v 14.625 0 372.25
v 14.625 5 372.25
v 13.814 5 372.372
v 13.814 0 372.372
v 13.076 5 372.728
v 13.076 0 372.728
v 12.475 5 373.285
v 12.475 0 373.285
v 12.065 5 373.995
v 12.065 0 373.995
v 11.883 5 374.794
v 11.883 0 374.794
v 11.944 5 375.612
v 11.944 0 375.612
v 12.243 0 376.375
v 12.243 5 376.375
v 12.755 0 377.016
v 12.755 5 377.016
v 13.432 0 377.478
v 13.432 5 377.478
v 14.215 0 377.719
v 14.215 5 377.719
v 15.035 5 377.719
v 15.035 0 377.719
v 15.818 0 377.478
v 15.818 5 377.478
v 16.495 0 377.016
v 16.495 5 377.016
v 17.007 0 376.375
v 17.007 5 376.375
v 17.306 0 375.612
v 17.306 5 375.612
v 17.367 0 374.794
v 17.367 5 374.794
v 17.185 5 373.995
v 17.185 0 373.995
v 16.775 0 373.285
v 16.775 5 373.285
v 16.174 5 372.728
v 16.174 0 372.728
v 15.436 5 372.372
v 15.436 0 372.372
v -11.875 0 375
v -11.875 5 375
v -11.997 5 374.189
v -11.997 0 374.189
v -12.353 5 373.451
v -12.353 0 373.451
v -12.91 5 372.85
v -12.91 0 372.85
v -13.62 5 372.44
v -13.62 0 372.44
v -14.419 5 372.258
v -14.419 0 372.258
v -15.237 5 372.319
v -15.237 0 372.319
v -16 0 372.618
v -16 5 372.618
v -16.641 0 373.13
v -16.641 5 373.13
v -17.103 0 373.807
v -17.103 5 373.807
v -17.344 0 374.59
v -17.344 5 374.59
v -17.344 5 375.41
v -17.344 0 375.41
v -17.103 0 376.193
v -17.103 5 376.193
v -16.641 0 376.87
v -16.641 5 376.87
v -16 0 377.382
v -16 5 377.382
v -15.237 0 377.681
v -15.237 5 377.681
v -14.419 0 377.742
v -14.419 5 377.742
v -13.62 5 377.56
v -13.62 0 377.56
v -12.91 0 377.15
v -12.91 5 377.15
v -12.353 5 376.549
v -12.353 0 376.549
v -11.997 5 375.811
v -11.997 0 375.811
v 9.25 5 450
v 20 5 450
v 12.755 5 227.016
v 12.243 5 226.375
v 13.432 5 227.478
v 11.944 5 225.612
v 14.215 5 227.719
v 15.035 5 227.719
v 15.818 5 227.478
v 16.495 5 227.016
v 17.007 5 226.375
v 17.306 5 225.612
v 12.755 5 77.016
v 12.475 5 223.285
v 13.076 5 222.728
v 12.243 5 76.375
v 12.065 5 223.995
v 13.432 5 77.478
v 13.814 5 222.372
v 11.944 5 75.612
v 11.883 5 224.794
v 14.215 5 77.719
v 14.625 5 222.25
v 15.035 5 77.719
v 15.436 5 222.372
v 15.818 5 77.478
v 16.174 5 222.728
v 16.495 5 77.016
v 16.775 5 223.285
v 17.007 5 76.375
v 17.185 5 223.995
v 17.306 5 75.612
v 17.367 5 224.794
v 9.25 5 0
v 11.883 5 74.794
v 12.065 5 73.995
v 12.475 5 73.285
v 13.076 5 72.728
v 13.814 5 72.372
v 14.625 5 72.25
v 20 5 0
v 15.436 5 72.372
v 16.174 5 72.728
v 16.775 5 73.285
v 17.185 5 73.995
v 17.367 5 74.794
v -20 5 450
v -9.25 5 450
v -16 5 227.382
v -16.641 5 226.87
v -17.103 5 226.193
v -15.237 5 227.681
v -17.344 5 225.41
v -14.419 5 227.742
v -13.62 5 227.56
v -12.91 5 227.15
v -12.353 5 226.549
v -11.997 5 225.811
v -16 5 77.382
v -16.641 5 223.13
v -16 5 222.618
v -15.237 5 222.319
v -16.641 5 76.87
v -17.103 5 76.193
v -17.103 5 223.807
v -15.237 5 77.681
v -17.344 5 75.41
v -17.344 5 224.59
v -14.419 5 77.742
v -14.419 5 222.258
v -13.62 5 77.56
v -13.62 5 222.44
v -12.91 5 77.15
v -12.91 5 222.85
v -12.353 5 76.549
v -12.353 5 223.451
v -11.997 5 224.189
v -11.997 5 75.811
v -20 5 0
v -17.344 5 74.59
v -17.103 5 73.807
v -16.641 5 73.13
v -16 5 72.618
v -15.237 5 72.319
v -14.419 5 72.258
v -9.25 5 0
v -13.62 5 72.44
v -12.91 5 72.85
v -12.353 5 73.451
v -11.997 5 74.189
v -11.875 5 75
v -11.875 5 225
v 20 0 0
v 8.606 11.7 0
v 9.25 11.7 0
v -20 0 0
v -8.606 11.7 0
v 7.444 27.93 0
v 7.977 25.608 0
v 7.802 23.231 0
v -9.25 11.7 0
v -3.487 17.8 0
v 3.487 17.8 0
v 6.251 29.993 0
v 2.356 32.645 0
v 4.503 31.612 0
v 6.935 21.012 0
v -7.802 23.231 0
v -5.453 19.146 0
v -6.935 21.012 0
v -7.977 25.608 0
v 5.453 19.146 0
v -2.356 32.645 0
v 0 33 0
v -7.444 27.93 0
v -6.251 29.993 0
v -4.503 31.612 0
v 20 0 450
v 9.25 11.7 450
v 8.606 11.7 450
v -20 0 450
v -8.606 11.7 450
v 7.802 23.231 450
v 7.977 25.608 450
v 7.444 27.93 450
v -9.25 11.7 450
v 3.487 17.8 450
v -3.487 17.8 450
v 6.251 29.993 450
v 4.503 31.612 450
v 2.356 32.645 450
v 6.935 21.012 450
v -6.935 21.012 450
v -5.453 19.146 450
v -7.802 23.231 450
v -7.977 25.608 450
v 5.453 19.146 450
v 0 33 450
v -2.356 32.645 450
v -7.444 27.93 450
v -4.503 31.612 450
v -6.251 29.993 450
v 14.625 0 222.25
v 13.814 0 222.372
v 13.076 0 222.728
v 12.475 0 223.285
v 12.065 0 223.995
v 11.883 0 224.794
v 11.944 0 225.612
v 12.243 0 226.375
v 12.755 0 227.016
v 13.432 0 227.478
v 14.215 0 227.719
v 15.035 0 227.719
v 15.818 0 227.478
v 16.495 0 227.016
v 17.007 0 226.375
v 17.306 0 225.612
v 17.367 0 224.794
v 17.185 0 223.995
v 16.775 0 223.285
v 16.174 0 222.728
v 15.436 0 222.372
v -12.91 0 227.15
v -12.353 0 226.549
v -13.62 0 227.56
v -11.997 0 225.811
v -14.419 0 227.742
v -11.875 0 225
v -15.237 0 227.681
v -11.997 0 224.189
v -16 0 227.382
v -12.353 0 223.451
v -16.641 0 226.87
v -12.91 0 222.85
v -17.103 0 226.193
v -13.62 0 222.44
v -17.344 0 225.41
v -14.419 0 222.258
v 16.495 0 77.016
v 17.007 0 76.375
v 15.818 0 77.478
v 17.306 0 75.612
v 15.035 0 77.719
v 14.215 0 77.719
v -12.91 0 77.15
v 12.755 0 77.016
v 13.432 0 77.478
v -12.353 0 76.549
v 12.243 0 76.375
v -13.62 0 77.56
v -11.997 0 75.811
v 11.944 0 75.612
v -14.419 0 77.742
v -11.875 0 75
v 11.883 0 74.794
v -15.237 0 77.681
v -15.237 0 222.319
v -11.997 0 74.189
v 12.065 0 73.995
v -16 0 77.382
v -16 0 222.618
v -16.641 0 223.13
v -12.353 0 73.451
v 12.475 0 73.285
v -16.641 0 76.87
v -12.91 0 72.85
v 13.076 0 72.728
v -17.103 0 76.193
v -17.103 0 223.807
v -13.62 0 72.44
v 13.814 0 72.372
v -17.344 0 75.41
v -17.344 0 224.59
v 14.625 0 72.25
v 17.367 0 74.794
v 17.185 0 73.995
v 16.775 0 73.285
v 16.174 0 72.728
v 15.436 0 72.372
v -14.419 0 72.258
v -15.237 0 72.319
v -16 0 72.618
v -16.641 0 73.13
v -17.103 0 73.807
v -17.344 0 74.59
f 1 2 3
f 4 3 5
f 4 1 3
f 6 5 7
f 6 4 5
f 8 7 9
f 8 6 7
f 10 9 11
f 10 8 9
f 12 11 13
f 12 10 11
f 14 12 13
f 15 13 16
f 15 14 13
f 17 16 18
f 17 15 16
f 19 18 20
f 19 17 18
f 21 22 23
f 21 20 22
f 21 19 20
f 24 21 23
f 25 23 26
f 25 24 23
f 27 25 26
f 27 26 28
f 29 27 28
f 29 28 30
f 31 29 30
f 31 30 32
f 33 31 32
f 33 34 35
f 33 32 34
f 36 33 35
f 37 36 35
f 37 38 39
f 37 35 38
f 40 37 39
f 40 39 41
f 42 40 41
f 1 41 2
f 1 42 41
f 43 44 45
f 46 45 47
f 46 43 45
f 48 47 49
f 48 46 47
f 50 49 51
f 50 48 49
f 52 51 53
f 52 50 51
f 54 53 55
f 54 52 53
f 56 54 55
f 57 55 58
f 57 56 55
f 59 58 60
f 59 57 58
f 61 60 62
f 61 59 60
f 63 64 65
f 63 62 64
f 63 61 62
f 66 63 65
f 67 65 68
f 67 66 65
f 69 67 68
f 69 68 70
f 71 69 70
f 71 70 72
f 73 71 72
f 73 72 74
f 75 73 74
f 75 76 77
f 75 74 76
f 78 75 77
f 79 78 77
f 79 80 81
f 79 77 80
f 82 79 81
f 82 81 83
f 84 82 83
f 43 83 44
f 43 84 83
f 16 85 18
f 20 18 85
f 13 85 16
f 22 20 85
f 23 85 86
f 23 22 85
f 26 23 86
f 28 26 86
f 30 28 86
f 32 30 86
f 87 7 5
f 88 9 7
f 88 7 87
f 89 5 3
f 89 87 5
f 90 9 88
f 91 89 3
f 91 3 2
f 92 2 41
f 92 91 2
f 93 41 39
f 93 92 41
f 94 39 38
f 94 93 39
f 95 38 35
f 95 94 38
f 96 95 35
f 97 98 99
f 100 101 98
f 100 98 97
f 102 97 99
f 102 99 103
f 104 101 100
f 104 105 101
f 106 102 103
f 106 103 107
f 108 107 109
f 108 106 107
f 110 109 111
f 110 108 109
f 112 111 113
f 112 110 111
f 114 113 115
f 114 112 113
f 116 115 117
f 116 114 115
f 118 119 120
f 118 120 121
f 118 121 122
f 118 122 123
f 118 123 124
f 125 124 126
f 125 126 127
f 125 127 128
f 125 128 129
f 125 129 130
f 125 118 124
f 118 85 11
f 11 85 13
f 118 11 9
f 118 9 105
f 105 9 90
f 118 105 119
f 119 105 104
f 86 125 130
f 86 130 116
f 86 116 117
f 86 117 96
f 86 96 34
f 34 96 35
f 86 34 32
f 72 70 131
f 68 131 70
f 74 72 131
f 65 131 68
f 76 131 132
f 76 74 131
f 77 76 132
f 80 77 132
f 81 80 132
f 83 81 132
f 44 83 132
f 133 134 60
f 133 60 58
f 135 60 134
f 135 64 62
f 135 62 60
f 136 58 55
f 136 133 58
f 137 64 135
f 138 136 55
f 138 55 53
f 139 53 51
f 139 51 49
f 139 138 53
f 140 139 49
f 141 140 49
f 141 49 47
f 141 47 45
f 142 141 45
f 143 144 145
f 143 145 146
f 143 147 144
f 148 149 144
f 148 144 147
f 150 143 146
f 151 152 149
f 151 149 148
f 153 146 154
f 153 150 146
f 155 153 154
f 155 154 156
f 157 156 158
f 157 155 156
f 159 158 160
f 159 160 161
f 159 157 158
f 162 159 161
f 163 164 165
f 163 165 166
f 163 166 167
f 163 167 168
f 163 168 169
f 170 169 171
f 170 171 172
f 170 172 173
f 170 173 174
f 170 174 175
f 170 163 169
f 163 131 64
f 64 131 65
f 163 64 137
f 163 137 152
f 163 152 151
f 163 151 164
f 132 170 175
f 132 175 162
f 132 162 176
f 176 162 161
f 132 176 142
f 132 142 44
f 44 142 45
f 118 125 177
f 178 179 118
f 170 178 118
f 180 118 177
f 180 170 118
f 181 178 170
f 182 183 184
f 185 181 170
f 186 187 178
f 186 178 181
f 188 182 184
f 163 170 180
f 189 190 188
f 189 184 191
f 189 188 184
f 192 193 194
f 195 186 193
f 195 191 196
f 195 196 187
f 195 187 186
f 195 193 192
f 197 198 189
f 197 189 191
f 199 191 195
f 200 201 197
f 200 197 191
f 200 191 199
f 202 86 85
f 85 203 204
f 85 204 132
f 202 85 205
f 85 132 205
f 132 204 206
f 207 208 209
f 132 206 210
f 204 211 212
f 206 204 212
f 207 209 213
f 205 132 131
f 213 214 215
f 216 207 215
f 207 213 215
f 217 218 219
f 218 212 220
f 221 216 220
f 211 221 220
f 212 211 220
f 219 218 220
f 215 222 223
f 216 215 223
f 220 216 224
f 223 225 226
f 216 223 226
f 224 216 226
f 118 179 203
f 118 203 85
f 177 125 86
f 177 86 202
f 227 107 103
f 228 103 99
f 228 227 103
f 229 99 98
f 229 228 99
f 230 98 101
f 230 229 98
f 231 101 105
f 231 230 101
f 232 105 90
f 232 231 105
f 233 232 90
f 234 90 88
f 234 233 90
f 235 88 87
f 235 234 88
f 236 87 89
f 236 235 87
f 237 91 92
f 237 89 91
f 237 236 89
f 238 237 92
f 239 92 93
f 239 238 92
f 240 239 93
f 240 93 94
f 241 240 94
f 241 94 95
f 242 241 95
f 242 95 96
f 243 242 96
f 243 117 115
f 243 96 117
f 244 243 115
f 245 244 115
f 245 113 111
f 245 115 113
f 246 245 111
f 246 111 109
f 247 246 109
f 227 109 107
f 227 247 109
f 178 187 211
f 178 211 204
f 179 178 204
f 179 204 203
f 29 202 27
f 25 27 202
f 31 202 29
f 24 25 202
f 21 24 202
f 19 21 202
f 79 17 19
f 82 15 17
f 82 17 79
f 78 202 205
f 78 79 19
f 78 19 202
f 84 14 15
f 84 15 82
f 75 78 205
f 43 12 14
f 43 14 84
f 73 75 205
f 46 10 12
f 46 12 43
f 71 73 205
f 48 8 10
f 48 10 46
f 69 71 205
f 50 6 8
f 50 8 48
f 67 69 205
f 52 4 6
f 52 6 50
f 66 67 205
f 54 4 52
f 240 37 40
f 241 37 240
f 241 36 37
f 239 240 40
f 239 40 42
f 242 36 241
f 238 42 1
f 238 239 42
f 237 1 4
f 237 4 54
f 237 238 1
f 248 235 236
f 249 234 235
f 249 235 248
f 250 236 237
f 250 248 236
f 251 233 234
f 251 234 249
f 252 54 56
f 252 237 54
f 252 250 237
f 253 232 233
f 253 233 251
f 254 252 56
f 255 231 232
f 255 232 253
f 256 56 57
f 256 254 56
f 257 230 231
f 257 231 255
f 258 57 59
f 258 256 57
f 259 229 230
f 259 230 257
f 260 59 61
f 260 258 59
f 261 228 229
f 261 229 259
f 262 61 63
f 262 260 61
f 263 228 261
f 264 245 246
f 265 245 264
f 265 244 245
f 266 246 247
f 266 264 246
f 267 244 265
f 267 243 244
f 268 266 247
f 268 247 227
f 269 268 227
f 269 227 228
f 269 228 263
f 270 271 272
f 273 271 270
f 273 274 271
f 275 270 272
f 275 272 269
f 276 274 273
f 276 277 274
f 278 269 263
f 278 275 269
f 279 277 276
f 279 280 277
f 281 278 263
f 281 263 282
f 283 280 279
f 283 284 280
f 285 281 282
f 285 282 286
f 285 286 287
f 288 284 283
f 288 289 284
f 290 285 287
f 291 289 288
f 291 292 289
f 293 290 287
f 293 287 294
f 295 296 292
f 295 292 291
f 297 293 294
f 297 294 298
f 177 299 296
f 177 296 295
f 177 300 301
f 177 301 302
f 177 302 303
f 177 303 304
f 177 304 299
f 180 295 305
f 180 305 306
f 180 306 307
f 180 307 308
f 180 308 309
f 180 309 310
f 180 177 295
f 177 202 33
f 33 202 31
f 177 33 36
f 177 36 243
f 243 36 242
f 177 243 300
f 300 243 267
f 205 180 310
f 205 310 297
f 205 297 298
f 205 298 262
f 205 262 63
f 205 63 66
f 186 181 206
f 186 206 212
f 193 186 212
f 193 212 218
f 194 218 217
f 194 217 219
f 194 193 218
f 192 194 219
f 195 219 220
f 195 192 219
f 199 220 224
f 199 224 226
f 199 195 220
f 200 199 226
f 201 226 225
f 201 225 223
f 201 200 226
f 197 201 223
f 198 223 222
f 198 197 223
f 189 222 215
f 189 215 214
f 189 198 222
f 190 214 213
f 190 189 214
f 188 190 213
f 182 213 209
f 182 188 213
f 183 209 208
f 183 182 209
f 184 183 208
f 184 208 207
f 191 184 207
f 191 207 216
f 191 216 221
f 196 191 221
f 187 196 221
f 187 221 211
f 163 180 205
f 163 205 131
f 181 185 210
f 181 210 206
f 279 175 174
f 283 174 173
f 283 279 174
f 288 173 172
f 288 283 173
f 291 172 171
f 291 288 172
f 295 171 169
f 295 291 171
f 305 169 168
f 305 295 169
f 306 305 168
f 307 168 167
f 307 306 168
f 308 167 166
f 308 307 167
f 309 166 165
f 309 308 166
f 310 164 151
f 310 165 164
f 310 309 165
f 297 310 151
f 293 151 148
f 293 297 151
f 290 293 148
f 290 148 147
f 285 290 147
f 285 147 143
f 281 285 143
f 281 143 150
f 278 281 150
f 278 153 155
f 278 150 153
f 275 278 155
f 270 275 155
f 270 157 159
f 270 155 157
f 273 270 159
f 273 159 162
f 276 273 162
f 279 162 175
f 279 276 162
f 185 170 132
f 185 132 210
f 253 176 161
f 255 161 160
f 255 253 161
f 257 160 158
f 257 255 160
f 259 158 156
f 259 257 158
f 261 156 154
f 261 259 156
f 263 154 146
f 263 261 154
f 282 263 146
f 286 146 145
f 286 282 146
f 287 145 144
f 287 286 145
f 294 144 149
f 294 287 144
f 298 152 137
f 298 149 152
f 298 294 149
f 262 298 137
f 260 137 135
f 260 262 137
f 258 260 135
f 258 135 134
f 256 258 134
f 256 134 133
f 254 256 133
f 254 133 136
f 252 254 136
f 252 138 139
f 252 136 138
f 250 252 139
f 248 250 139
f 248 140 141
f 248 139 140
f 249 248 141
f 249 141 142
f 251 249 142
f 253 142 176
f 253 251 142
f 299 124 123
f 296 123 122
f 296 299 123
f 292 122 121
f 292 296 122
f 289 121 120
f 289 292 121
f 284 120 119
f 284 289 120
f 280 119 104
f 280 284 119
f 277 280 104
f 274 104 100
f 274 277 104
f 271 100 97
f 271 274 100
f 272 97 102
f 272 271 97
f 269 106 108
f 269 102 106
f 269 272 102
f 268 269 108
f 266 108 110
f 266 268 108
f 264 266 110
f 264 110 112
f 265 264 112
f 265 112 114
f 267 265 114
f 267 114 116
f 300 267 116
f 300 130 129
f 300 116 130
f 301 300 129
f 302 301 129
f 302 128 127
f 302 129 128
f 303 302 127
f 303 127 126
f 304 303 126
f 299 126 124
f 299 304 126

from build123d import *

# Parameters (mm, degrees)
BOSS_EXTRUDE1_DEPTH = 450
SKETCH2_R           = 2.75
CUT_EXTRUDE1_DEPTH  = 450


with BuildPart() as part:
    # Sketch1 → Boss-Extrude1 (new body)
    with BuildSketch(Plane.XY):
        with BuildLine():
            Line((20, 0), (-20, 0))
            Line((-20, 0), (-20, 5))
            Line((-20, 5), (-9.25, 5))
            Line((-9.25, 5), (-9.25, 11.7))
            Line((-9.25, 11.7), (-8.605626905, 11.7))
            Line((-8.605626905, 11.7), (-3.487119155, 17.8))
            ThreePointArc((-3.487119155, 17.8), (0, 33), (3.487119155, 17.8))
            Line((3.487119155, 17.8), (8.605626905, 11.7))
            Line((8.605626905, 11.7), (9.25, 11.7))
            Line((9.25, 11.7), (9.25, 5))
            Line((9.25, 5), (20, 5))
            Line((20, 5), (20, 0))
        make_face()
    extrude(amount=BOSS_EXTRUDE1_DEPTH)

    # Sketch2 → Cut-Extrude1 (cut)
    with BuildSketch(Plane(origin=(0, 0, 0), x_dir=(1, 0, 0), z_dir=(0, 1, 0))):
        with Locations((-14.625, -75)):
            Circle(SKETCH2_R)
        with Locations(Location((14.625, -75, 0), (0, 0, 90))):
            Circle(SKETCH2_R)
        with Locations((-14.625, -225)):
            Circle(SKETCH2_R)
        with Locations(Location((14.625, -225, 0), (0, 0, 90))):
            Circle(SKETCH2_R)
        with Locations((-14.625, -375)):
            Circle(SKETCH2_R)
        with Locations(Location((14.625, -375, 0), (0, 0, 90))):
            Circle(SKETCH2_R)
    extrude(amount=CUT_EXTRUDE1_DEPTH, mode=Mode.SUBTRACT)


solid = part.part
